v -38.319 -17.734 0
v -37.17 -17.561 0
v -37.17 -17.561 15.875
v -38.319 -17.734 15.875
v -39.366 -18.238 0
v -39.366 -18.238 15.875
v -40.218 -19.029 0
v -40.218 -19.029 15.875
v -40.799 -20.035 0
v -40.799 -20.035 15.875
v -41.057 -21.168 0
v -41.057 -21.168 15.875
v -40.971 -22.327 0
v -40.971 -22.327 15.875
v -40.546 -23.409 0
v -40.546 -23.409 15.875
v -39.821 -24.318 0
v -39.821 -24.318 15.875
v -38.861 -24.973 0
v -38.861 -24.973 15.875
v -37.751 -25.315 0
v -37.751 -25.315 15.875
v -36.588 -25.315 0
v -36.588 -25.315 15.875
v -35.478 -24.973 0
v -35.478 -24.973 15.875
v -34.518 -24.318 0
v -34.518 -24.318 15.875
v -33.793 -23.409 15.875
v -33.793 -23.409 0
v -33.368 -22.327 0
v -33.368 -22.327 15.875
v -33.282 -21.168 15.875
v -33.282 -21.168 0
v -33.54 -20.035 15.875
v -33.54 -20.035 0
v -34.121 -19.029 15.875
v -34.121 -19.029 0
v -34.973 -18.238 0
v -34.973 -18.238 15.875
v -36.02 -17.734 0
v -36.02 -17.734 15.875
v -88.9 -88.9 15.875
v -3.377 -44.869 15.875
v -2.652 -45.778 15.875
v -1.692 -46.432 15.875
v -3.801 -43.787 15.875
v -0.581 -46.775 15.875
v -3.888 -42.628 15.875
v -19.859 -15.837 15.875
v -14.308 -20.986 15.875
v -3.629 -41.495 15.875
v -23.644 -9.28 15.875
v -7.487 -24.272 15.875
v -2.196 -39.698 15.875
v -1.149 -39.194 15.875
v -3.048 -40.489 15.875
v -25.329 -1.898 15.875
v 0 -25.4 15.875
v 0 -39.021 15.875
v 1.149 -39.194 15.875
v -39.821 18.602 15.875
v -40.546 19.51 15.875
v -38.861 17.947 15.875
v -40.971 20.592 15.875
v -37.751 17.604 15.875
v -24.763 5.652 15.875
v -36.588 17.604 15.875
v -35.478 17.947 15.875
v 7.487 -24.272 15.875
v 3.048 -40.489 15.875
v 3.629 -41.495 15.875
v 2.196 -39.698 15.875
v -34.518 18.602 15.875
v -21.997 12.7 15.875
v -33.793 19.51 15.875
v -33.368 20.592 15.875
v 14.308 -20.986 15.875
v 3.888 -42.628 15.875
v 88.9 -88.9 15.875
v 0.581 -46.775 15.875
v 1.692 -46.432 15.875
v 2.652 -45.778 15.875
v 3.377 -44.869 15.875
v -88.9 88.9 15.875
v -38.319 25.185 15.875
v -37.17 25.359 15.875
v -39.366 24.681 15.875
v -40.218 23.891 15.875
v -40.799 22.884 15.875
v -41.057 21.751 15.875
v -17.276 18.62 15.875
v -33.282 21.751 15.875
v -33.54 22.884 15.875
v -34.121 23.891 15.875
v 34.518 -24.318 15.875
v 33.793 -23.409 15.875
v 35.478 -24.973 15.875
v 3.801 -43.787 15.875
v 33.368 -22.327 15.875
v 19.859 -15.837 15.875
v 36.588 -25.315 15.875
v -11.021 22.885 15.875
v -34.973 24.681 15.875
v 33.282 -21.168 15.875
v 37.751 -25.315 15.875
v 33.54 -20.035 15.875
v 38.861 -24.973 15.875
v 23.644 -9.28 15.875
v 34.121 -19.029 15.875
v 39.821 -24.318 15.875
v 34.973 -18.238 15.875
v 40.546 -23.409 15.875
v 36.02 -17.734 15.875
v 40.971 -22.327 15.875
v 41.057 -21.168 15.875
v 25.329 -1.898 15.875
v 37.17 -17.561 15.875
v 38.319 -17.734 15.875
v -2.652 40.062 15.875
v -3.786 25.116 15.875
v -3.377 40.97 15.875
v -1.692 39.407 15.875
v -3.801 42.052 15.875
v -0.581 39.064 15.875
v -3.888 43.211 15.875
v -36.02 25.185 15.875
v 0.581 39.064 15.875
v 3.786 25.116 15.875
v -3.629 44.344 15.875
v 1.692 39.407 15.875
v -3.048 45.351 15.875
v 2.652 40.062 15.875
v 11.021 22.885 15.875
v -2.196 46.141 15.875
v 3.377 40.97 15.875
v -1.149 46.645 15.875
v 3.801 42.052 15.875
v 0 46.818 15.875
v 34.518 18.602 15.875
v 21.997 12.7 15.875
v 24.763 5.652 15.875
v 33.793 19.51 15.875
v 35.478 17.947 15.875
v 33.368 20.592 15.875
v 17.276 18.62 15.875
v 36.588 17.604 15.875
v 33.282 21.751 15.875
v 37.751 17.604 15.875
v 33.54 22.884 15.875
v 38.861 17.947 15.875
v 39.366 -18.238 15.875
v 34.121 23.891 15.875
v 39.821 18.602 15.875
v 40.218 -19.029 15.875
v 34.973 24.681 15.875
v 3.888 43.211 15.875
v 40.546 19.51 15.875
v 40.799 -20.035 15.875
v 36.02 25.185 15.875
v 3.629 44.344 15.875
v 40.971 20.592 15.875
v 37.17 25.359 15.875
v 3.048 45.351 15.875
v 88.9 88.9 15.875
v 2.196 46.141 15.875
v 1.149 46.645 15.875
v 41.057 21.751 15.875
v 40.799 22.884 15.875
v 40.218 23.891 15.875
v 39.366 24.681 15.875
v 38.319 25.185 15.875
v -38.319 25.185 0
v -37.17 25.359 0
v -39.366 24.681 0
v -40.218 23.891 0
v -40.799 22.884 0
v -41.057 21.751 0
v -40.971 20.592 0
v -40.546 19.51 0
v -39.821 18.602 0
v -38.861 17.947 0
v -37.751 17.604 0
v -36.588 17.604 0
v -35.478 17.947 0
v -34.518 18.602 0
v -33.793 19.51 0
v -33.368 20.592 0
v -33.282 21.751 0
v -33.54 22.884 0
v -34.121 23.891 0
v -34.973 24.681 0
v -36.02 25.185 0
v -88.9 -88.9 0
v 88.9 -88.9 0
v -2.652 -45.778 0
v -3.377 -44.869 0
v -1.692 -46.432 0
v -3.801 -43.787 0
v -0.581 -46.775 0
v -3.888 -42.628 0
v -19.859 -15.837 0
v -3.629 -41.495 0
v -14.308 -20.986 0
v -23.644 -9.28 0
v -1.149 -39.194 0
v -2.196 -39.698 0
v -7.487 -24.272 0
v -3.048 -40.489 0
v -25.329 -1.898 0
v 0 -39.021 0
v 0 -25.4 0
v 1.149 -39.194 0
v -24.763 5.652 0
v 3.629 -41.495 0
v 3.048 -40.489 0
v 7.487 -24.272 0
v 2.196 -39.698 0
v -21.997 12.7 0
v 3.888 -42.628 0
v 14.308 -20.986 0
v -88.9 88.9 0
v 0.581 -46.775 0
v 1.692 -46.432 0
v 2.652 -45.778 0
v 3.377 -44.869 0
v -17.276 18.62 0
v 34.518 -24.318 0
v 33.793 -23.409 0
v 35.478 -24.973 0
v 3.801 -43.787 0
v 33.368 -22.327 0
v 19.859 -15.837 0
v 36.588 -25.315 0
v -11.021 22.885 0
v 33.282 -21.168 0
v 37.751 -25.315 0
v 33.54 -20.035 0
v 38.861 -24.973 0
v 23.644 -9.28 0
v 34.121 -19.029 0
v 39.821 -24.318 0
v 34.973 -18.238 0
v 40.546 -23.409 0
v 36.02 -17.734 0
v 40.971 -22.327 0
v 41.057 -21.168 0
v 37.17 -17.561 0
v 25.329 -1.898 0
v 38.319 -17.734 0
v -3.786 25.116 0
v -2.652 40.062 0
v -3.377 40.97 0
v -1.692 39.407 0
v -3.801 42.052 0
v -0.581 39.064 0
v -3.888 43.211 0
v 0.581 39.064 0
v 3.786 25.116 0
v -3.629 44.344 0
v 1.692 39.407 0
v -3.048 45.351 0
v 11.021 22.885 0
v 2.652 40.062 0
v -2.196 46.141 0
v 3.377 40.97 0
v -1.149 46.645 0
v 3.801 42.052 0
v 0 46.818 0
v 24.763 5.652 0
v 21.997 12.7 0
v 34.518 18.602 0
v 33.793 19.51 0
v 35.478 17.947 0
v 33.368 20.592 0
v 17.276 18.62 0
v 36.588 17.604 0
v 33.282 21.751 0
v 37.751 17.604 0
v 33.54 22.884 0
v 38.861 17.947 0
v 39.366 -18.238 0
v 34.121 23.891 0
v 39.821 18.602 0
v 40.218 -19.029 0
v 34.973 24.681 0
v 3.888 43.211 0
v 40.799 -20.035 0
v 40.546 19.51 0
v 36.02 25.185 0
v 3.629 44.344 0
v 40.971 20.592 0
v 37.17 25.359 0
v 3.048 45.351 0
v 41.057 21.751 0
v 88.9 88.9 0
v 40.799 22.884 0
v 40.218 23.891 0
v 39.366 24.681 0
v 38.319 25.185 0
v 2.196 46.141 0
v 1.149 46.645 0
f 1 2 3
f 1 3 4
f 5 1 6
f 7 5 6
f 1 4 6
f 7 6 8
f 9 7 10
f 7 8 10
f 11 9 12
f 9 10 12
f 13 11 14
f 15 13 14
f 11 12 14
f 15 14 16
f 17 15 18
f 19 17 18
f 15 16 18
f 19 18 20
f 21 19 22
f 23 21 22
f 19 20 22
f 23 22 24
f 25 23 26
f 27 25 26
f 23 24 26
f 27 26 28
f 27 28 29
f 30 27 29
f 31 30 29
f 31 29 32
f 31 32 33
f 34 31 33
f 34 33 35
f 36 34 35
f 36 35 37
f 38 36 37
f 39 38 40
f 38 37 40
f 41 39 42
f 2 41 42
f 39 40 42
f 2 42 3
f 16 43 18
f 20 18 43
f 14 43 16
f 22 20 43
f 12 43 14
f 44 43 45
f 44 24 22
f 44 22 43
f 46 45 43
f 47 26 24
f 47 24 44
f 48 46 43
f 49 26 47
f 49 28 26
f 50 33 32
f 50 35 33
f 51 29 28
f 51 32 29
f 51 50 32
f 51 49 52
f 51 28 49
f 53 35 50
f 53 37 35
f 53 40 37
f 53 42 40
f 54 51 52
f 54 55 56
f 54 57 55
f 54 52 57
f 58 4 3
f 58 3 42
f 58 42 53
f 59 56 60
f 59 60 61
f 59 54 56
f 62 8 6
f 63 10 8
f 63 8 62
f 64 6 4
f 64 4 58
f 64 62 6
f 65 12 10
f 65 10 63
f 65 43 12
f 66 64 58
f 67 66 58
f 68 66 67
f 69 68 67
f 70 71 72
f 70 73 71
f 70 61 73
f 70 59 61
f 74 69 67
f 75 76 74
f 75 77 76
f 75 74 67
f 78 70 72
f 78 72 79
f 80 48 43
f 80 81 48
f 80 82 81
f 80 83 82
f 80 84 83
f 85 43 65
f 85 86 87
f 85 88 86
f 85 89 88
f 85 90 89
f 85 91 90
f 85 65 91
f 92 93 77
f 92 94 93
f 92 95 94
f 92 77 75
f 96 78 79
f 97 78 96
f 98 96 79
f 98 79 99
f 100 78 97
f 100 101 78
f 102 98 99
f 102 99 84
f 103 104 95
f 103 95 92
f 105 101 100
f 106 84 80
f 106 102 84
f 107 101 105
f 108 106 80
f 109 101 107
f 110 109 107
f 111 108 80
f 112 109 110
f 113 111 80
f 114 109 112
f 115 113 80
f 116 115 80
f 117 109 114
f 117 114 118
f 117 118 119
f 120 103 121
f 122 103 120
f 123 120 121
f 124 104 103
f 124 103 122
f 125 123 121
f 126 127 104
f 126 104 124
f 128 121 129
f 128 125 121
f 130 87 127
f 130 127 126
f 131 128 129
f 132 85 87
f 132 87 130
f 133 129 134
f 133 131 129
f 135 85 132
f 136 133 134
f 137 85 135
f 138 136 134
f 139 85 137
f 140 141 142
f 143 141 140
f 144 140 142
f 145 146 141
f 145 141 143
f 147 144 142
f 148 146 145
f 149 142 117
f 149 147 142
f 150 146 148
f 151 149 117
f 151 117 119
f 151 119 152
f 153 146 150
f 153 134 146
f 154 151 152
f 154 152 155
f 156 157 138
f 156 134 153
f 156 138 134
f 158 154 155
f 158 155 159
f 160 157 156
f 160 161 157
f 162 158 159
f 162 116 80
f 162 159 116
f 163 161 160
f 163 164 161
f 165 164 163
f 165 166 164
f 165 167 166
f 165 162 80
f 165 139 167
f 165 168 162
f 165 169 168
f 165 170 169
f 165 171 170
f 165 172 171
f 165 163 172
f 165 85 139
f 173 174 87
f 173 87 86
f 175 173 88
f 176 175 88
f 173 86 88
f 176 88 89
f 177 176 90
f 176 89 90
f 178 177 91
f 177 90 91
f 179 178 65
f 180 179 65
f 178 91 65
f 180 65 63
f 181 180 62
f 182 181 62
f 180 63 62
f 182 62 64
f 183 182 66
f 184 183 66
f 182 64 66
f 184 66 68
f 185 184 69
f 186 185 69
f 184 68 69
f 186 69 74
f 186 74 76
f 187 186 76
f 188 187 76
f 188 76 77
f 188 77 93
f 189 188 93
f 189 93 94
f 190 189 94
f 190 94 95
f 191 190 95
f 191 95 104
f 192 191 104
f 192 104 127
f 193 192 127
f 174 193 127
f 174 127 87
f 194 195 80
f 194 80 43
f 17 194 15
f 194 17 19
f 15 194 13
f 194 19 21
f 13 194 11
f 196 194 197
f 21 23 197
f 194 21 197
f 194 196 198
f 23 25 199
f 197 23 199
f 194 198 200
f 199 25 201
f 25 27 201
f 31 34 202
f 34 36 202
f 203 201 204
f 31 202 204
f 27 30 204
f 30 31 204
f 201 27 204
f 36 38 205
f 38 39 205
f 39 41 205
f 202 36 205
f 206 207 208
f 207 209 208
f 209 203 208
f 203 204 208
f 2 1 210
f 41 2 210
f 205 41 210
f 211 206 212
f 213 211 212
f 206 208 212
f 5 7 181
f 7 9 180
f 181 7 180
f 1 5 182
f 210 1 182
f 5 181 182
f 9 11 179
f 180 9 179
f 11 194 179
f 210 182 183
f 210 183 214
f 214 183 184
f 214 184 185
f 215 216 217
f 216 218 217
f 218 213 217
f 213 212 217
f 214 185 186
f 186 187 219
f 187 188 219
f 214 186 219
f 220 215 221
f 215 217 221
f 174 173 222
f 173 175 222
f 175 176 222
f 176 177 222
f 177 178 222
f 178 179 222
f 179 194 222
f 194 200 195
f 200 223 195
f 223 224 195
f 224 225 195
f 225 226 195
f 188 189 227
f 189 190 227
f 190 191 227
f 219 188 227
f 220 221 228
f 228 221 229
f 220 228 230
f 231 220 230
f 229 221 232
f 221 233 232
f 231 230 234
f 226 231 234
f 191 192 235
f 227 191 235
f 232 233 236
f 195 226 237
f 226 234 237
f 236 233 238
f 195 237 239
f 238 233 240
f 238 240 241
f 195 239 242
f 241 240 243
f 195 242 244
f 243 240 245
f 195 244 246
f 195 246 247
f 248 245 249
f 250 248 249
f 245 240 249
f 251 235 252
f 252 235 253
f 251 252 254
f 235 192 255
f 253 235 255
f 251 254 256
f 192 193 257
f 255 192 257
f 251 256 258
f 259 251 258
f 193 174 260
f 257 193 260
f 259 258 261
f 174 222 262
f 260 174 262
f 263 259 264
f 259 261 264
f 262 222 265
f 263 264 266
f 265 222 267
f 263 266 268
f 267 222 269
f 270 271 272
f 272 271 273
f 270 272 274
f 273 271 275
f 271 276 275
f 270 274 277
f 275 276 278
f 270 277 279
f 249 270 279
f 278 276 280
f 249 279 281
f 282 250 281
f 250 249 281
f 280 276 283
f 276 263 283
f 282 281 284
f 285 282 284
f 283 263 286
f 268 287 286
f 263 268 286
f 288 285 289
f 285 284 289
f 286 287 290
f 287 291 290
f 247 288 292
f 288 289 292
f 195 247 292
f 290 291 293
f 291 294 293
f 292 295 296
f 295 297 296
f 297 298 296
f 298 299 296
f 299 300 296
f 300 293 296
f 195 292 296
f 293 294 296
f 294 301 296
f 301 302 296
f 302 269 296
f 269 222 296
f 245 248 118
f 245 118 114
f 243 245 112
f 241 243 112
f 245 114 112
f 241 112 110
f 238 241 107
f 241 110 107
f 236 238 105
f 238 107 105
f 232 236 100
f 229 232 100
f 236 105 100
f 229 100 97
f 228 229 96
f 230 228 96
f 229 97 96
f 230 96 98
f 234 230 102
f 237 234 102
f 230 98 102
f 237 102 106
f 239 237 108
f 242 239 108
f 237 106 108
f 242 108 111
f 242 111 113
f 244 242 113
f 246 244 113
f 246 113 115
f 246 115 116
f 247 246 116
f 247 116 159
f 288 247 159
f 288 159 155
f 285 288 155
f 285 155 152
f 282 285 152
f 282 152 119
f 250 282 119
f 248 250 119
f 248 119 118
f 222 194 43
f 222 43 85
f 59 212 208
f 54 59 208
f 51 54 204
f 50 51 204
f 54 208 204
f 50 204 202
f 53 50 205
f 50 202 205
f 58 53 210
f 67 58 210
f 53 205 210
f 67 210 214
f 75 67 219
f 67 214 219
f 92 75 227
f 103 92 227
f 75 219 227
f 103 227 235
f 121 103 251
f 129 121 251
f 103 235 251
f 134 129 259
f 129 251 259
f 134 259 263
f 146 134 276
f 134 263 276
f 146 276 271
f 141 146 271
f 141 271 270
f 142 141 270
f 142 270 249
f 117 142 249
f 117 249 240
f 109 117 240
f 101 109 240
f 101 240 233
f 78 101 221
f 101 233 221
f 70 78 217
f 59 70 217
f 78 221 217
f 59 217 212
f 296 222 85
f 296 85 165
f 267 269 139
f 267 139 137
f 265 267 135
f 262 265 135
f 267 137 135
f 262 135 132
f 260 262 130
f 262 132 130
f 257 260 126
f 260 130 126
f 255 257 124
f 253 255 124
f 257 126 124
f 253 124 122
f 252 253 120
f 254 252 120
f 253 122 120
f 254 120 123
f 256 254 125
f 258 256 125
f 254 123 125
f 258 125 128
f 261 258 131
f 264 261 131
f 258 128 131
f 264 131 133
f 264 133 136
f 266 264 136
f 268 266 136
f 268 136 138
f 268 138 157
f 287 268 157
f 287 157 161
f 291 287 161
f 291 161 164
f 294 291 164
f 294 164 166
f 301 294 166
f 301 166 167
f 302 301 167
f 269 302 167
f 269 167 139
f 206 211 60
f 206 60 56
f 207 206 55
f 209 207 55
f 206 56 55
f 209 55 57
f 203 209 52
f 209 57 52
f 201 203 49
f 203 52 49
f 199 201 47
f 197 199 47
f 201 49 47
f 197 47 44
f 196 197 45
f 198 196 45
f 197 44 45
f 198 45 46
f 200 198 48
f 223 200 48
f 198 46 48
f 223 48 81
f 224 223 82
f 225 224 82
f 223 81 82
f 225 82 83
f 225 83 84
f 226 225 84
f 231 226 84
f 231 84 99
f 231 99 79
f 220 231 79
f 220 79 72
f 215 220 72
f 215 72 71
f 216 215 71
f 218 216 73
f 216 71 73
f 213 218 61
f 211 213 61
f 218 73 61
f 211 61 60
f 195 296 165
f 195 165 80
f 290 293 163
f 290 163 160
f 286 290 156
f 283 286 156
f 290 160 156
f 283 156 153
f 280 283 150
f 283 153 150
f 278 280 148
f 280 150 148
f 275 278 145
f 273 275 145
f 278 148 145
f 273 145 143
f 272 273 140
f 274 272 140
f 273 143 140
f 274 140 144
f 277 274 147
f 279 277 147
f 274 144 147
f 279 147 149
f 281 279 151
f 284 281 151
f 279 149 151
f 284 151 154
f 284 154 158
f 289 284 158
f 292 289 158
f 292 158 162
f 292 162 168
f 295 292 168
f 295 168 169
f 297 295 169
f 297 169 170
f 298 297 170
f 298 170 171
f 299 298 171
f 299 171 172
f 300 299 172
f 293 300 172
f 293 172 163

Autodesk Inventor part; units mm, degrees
ref_plane "YZ Plane" through (0, 0, 0) normal (1, 0, 0) x (0, 1, 0)
ref_plane "XZ Plane" through (0, 0, 0) normal (0, 1, 0) x (-1, 0, 0)
ref_plane "XY Plane" through (0, 0, 0) normal (0, 0, 1) x (1, 0, 0)
sketch "Sketch1" plane through (0, 0, 0) normal (0, 0, 1) x (1, 0, 0)
  line L0 (88.9, -88.9) -> (-88.9, -88.9)
  line L1 (-88.9, -88.9) -> (-88.9, 88.9)
  line L2 (-88.9, 88.9) -> (88.9, 88.9)
  line L3 (88.9, 88.9) -> (88.9, -88.9)
  line L4 (88.9, -88.9) -> (-88.9, 88.9) construction
  line L5 (-88.9, -88.9) -> (88.9, 88.9) construction
  point P0 (0, 0)
  dimension "d2" = 177.8
extrude "Extrusion1" add sketch "Sketch1" along normal blind 15.875
sketch "Sketch2" plane through (0, 0, 0) normal (0, 0, -1) x (-1, 0, 0)
  circle A0 centre (0, 0) radius 60.325 projected
  circle A1 centre (0, 42.9196) radius 9.6774 projected
  circle A2 centre (-37.1695, 21.4598) radius 9.6774 projected
  circle A3 centre (-37.1695, -21.4598) radius 9.6774 projected
  circle A4 centre (0, -42.9196) radius 9.6774 projected
  circle A5 centre (37.1695, -21.4598) radius 9.6774 projected
  circle A6 centre (37.1695, 21.4598) radius 9.6774 projected
  line L0 (18.829, -36.4227) -> (14.1966, -28.3993) projected
  arc A7 (-14.1966, -28.3993) -> (14.1966, -28.3993) centre (0, 0) ccw projected
  line L1 (-14.1966, -28.3993) -> (-18.829, -36.4227) projected
  line L2 (-18.829, -36.4227) -> (-22.1285, -34.5177) projected
  line L3 (-22.1285, -34.5177) -> (-17.4962, -26.4943) projected
  arc A8 (-31.6928, -1.905) -> (-17.4962, -26.4943) centre (0, 0) ccw projected
  line L4 (-31.6928, -1.905) -> (-40.9575, -1.905) projected
  line L5 (-40.9575, -1.905) -> (-40.9575, 1.905) projected
  line L6 (-40.9575, 1.905) -> (-31.6928, 1.905) projected
  arc A9 (-17.4962, 26.4943) -> (-31.6928, 1.905) centre (0, 0) ccw projected
  line L7 (-17.4962, 26.4943) -> (-22.1285, 34.5177) projected
  line L8 (-22.1285, 34.5177) -> (-18.829, 36.4227) projected
  line L9 (-18.829, 36.4227) -> (-14.1966, 28.3993) projected
  arc A10 (14.1966, 28.3993) -> (-14.1966, 28.3993) centre (0, 0) ccw projected
  line L10 (14.1966, 28.3993) -> (18.829, 36.4227) projected
  line L11 (18.829, 36.4227) -> (22.1285, 34.5177) projected
  line L12 (22.1285, 34.5177) -> (17.4962, 26.4943) projected
  arc A11 (31.6928, 1.905) -> (17.4962, 26.4943) centre (0, 0) ccw projected
  line L13 (31.6928, 1.905) -> (40.9575, 1.905) projected
  line L14 (40.9575, 1.905) -> (40.9575, -1.905) projected
  line L15 (40.9575, -1.905) -> (31.6928, -1.905) projected
  arc A12 (17.4962, -26.4943) -> (31.6928, -1.905) centre (0, 0) ccw projected
  line L16 (17.4962, -26.4943) -> (22.1285, -34.5177) projected
  line L17 (22.1285, -34.5177) -> (18.829, -36.4227) projected
  point P0 (0, 0)
hole "Hole1" at (0, 42.9196, 0) at (37.1695, 21.4598, 0) at (37.1695, -21.4598, 0) at (0, -42.9196, 0) at (-37.1695, -21.4598, 0) at (-37.1695, 21.4598, 0) direction (0, 0, 1) diameter 7.7978 end through all thread size "3/8-16 UNC" class "2B" standard "ANSI Unified Screw Threads"
sketch "Sketch3" plane through (0, 0, 15.875) normal (0, 0, 1) x (1, 0, 0)
  circle A0 centre (0, 0) radius 20.6375 projected
  point P0 (0, 0)
hole "Hole2" at (0, 0, 15.875) direction (0, 0, -1) diameter 50.8 end through all
properties part number "Mounting Plate" material "Aluminum 6061"
